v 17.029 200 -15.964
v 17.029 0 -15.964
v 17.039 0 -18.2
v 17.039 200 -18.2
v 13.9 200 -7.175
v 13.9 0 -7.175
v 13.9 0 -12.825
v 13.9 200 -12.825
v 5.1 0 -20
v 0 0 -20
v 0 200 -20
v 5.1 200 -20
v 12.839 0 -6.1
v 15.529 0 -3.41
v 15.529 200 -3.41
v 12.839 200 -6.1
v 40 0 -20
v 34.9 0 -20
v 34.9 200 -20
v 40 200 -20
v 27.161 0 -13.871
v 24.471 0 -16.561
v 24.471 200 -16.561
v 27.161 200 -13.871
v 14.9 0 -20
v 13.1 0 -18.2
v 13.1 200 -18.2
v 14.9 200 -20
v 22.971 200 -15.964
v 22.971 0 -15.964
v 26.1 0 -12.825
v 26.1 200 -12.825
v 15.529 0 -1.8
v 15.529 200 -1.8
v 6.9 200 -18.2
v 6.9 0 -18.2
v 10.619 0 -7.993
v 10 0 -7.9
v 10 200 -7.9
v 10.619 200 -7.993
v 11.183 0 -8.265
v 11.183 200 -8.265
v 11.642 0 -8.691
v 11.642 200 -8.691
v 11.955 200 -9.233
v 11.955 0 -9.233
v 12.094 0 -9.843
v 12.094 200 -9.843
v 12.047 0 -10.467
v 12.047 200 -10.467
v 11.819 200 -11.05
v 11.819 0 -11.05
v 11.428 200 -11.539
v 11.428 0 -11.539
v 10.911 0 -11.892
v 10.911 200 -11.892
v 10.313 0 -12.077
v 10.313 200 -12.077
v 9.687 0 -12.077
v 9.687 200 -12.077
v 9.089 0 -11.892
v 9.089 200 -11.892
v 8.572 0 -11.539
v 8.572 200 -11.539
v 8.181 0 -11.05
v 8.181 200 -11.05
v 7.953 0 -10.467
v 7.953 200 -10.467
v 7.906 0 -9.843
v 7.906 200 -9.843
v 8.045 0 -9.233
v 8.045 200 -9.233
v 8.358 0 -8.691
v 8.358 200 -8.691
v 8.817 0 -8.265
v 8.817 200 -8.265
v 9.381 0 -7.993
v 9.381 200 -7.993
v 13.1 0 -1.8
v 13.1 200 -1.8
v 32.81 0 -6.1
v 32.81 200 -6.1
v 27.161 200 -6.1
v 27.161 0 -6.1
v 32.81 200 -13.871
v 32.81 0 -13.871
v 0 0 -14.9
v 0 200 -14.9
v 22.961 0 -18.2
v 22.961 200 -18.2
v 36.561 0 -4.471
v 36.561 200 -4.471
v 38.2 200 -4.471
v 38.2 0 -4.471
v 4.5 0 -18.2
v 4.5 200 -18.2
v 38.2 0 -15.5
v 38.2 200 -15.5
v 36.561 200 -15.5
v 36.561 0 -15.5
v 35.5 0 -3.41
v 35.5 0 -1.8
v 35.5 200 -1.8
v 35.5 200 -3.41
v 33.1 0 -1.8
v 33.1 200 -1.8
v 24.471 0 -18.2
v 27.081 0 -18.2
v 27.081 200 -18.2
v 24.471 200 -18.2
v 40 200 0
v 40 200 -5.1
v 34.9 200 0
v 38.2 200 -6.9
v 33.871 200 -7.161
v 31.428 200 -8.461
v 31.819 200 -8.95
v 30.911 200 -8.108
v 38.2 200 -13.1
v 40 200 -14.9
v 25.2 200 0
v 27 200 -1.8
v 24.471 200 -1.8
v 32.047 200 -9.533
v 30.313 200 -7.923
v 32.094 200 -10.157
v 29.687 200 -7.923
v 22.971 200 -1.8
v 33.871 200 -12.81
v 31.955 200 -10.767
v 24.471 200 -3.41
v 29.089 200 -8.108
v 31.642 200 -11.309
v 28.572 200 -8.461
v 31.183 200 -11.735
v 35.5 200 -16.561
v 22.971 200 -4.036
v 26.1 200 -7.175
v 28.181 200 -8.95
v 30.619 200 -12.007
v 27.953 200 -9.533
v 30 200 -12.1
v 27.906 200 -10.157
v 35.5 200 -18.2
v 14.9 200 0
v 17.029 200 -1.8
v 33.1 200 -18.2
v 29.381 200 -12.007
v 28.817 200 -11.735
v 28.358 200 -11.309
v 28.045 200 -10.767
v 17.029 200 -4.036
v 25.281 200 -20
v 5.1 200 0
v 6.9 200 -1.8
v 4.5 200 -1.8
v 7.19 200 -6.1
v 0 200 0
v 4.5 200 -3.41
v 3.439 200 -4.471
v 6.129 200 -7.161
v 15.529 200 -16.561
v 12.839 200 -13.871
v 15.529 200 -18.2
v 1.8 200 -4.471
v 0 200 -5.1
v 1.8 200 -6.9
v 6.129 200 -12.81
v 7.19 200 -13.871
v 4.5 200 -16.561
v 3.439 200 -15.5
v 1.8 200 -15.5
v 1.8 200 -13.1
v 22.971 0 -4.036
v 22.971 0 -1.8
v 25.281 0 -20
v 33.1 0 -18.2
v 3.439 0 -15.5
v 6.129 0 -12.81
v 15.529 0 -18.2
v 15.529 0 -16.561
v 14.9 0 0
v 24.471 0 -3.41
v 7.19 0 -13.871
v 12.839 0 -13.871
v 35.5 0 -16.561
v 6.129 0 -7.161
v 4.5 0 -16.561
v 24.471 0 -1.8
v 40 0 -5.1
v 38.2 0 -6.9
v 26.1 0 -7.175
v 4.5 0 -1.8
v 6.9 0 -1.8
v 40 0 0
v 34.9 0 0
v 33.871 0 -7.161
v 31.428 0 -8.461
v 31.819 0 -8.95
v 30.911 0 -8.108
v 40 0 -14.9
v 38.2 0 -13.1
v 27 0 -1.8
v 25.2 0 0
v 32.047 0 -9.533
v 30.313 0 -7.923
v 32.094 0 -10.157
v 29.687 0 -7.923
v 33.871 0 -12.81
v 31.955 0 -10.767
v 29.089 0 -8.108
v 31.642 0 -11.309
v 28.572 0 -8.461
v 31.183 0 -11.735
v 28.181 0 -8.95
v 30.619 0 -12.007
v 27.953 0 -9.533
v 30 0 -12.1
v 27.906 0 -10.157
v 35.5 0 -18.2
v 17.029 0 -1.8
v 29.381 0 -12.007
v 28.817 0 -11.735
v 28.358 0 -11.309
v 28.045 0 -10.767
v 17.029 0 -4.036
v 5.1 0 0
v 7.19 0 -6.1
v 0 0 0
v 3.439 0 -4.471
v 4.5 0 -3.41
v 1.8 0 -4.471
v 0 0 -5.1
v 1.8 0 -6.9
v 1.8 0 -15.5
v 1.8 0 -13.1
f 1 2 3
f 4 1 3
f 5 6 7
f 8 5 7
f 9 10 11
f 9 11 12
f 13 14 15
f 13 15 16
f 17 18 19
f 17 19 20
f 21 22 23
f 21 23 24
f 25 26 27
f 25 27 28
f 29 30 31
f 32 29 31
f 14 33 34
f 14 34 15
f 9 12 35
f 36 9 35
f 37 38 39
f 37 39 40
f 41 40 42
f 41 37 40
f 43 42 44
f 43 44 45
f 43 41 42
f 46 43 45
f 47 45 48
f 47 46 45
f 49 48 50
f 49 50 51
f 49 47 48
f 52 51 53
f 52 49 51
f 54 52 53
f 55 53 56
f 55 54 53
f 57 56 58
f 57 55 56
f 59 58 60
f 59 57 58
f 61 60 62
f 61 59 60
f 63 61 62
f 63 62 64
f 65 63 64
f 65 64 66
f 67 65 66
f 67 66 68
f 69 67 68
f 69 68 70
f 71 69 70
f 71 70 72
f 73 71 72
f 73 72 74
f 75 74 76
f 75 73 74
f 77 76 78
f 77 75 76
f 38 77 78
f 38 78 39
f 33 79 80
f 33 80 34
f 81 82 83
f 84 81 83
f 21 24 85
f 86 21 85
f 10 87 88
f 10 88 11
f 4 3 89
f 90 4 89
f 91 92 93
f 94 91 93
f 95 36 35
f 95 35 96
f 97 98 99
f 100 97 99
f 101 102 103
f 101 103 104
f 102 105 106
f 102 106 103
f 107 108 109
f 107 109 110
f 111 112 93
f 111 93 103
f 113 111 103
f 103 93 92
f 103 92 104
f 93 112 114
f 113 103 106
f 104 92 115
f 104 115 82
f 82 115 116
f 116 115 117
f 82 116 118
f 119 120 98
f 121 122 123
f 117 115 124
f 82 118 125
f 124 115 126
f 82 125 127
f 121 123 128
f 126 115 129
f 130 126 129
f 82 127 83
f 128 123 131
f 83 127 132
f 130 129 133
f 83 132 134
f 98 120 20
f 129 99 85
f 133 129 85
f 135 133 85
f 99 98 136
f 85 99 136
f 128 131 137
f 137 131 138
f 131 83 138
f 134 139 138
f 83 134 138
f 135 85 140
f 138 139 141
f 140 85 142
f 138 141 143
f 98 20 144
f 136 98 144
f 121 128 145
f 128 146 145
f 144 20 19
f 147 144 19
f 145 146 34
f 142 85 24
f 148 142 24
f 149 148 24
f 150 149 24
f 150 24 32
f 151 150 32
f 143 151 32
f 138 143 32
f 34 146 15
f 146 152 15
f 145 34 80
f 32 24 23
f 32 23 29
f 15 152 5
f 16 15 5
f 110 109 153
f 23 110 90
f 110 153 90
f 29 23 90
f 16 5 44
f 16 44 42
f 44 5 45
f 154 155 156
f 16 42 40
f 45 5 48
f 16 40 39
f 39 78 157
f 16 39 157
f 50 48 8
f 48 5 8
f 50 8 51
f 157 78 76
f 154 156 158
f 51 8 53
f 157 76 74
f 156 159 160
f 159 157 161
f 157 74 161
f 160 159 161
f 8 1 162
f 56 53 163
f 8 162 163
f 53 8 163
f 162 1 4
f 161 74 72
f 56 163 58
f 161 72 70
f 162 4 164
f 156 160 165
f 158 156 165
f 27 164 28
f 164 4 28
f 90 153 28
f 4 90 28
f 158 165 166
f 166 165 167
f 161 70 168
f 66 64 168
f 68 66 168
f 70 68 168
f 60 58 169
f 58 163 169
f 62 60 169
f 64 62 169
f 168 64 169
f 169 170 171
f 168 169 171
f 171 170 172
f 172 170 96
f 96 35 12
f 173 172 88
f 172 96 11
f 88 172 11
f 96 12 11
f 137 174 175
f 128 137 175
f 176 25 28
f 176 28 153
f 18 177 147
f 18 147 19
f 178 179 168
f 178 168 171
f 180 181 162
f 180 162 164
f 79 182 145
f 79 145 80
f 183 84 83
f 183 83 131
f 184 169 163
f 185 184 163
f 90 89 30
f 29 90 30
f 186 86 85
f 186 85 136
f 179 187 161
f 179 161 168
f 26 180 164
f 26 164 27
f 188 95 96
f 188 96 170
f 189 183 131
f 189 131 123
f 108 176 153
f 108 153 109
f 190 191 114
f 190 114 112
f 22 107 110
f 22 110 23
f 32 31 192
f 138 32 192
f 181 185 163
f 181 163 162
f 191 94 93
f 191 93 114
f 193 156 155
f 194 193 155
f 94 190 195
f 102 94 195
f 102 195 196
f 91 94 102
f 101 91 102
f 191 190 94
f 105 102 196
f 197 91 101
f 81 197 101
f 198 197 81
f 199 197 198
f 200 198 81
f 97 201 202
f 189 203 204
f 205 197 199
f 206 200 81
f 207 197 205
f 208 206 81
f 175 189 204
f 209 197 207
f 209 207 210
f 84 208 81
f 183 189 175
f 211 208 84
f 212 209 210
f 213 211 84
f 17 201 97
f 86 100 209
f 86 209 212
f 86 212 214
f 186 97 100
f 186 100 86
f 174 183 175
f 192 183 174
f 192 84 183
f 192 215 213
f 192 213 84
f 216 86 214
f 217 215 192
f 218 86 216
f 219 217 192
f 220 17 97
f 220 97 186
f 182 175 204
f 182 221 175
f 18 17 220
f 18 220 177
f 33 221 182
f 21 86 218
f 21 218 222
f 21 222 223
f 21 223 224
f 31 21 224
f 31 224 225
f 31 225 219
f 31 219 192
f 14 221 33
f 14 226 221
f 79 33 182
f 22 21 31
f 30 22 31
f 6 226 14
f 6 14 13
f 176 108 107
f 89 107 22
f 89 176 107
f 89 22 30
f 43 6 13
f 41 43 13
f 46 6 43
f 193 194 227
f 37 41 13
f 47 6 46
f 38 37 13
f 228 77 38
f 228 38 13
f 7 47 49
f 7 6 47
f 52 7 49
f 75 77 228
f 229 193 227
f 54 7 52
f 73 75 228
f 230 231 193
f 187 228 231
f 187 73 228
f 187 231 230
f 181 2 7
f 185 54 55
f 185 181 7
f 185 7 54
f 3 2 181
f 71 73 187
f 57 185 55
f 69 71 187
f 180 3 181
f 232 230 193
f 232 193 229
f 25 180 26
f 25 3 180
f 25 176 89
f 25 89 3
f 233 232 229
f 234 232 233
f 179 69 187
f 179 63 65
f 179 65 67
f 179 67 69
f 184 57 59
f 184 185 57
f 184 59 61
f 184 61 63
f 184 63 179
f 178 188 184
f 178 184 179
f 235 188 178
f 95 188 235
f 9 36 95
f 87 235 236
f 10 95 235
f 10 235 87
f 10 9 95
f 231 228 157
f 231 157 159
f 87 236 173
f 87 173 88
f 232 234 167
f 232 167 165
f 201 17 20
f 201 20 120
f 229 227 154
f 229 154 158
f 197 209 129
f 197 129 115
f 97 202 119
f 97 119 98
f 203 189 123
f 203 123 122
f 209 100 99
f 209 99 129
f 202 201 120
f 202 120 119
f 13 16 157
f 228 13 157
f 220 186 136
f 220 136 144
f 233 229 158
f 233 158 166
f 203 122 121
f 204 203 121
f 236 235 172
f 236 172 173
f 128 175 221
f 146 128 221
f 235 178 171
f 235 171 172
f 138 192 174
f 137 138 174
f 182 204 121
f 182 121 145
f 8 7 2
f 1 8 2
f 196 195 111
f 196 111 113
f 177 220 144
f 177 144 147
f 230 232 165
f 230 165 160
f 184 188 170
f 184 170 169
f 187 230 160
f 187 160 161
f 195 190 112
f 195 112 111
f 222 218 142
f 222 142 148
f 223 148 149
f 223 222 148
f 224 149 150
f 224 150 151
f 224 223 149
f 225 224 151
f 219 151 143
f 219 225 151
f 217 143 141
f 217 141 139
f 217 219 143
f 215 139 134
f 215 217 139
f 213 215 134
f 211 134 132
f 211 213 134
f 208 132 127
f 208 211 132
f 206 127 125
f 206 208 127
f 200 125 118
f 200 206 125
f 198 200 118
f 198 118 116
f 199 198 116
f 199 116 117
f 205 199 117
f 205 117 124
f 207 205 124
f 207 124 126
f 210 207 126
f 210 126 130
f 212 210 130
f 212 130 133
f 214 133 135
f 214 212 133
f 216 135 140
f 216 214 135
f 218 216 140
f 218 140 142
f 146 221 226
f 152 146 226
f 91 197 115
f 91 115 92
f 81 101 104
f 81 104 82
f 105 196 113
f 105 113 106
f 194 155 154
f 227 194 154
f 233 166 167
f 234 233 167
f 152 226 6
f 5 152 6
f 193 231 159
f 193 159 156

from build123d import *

# Parameters (mm, degrees)
SKETCH1_R           = 2.1
BOSS_EXTRUDE1_DEPTH = 200


with BuildPart() as part:
    # Sketch1 → Boss-Extrude1 (new body)
    with BuildSketch(Plane(origin=(0, 0, 0), x_dir=(1, 0, 0), z_dir=(0, 1, 0))):
        Polygon((1.8, 15.5), (1.8, 13.1), (0, 14.9), (0, 20), (5.1, 20), (6.9, 18.2), (4.5, 18.2), (4.5, 16.560660172), (7.190031555, 13.870628617), (12.839339828, 13.870628617), (15.529414018, 16.560702806), (15.529414018, 18.2), (13.1, 18.2), (14.9, 20), (25.280697212, 20), (27.080697212, 18.2), (24.470585982, 18.2), (24.470585982, 16.560702806), (27.160660172, 13.870628617), (32.809968445, 13.870628617), (35.5, 16.560660172), (35.5, 18.2), (33.1, 18.2), (34.9, 20), (40, 20), (40, 14.9), (38.2, 13.1), (38.2, 15.5), (36.560660172, 15.5), (33.870585982, 12.809925811), (33.870585982, 7.160617537), (36.560617537, 4.470585982), (38.2, 4.470585982), (38.2, 6.9), (40, 5.1), (40, 0), (34.9, 0), (33.1, 1.8), (35.499957366, 1.8), (35.499957366, 3.409925811), (32.809883176, 6.1), (27.160574903, 6.1), (24.470543348, 3.409968445), (24.470543348, 1.8), (27, 1.8), (25.2, 0), (14.9, 0), (13.1, 1.8), (15.529456652, 1.8), (15.529456652, 3.409968445), (12.839425097, 6.1), (7.190116824, 6.1), (4.500042634, 3.409925811), (4.500042634, 1.8), (6.9, 1.8), (5.1, 0), (0, 0), (0, 5.1), (1.8, 6.9), (1.8, 4.470585982), (3.439382463, 4.470585982), (6.129414018, 7.160617537), (6.129414018, 12.809925811), (3.439339828, 15.5), align=None)
        with Locations(Location((10, 10, 0), (0, 0, 270))):
            Circle(SKETCH1_R, mode=Mode.SUBTRACT)
        with Locations(Location((30, 10, 0), (0, 0, 90))):
            Circle(SKETCH1_R, mode=Mode.SUBTRACT)
        Polygon((13.900042634, 7.175345863), (13.900042634, 12.824654137), (17.029456652, 15.964292458), (17.039482597, 18.2), (22.960517403, 18.2), (22.970543348, 15.964292458), (26.099957366, 12.824654137), (26.099957366, 7.175345863), (22.970543348, 4.035707542), (22.970543348, 1.8), (17.029456652, 1.8), (17.029456652, 4.035707542), align=None, mode=Mode.SUBTRACT)
    extrude(amount=BOSS_EXTRUDE1_DEPTH)


solid = part.part
